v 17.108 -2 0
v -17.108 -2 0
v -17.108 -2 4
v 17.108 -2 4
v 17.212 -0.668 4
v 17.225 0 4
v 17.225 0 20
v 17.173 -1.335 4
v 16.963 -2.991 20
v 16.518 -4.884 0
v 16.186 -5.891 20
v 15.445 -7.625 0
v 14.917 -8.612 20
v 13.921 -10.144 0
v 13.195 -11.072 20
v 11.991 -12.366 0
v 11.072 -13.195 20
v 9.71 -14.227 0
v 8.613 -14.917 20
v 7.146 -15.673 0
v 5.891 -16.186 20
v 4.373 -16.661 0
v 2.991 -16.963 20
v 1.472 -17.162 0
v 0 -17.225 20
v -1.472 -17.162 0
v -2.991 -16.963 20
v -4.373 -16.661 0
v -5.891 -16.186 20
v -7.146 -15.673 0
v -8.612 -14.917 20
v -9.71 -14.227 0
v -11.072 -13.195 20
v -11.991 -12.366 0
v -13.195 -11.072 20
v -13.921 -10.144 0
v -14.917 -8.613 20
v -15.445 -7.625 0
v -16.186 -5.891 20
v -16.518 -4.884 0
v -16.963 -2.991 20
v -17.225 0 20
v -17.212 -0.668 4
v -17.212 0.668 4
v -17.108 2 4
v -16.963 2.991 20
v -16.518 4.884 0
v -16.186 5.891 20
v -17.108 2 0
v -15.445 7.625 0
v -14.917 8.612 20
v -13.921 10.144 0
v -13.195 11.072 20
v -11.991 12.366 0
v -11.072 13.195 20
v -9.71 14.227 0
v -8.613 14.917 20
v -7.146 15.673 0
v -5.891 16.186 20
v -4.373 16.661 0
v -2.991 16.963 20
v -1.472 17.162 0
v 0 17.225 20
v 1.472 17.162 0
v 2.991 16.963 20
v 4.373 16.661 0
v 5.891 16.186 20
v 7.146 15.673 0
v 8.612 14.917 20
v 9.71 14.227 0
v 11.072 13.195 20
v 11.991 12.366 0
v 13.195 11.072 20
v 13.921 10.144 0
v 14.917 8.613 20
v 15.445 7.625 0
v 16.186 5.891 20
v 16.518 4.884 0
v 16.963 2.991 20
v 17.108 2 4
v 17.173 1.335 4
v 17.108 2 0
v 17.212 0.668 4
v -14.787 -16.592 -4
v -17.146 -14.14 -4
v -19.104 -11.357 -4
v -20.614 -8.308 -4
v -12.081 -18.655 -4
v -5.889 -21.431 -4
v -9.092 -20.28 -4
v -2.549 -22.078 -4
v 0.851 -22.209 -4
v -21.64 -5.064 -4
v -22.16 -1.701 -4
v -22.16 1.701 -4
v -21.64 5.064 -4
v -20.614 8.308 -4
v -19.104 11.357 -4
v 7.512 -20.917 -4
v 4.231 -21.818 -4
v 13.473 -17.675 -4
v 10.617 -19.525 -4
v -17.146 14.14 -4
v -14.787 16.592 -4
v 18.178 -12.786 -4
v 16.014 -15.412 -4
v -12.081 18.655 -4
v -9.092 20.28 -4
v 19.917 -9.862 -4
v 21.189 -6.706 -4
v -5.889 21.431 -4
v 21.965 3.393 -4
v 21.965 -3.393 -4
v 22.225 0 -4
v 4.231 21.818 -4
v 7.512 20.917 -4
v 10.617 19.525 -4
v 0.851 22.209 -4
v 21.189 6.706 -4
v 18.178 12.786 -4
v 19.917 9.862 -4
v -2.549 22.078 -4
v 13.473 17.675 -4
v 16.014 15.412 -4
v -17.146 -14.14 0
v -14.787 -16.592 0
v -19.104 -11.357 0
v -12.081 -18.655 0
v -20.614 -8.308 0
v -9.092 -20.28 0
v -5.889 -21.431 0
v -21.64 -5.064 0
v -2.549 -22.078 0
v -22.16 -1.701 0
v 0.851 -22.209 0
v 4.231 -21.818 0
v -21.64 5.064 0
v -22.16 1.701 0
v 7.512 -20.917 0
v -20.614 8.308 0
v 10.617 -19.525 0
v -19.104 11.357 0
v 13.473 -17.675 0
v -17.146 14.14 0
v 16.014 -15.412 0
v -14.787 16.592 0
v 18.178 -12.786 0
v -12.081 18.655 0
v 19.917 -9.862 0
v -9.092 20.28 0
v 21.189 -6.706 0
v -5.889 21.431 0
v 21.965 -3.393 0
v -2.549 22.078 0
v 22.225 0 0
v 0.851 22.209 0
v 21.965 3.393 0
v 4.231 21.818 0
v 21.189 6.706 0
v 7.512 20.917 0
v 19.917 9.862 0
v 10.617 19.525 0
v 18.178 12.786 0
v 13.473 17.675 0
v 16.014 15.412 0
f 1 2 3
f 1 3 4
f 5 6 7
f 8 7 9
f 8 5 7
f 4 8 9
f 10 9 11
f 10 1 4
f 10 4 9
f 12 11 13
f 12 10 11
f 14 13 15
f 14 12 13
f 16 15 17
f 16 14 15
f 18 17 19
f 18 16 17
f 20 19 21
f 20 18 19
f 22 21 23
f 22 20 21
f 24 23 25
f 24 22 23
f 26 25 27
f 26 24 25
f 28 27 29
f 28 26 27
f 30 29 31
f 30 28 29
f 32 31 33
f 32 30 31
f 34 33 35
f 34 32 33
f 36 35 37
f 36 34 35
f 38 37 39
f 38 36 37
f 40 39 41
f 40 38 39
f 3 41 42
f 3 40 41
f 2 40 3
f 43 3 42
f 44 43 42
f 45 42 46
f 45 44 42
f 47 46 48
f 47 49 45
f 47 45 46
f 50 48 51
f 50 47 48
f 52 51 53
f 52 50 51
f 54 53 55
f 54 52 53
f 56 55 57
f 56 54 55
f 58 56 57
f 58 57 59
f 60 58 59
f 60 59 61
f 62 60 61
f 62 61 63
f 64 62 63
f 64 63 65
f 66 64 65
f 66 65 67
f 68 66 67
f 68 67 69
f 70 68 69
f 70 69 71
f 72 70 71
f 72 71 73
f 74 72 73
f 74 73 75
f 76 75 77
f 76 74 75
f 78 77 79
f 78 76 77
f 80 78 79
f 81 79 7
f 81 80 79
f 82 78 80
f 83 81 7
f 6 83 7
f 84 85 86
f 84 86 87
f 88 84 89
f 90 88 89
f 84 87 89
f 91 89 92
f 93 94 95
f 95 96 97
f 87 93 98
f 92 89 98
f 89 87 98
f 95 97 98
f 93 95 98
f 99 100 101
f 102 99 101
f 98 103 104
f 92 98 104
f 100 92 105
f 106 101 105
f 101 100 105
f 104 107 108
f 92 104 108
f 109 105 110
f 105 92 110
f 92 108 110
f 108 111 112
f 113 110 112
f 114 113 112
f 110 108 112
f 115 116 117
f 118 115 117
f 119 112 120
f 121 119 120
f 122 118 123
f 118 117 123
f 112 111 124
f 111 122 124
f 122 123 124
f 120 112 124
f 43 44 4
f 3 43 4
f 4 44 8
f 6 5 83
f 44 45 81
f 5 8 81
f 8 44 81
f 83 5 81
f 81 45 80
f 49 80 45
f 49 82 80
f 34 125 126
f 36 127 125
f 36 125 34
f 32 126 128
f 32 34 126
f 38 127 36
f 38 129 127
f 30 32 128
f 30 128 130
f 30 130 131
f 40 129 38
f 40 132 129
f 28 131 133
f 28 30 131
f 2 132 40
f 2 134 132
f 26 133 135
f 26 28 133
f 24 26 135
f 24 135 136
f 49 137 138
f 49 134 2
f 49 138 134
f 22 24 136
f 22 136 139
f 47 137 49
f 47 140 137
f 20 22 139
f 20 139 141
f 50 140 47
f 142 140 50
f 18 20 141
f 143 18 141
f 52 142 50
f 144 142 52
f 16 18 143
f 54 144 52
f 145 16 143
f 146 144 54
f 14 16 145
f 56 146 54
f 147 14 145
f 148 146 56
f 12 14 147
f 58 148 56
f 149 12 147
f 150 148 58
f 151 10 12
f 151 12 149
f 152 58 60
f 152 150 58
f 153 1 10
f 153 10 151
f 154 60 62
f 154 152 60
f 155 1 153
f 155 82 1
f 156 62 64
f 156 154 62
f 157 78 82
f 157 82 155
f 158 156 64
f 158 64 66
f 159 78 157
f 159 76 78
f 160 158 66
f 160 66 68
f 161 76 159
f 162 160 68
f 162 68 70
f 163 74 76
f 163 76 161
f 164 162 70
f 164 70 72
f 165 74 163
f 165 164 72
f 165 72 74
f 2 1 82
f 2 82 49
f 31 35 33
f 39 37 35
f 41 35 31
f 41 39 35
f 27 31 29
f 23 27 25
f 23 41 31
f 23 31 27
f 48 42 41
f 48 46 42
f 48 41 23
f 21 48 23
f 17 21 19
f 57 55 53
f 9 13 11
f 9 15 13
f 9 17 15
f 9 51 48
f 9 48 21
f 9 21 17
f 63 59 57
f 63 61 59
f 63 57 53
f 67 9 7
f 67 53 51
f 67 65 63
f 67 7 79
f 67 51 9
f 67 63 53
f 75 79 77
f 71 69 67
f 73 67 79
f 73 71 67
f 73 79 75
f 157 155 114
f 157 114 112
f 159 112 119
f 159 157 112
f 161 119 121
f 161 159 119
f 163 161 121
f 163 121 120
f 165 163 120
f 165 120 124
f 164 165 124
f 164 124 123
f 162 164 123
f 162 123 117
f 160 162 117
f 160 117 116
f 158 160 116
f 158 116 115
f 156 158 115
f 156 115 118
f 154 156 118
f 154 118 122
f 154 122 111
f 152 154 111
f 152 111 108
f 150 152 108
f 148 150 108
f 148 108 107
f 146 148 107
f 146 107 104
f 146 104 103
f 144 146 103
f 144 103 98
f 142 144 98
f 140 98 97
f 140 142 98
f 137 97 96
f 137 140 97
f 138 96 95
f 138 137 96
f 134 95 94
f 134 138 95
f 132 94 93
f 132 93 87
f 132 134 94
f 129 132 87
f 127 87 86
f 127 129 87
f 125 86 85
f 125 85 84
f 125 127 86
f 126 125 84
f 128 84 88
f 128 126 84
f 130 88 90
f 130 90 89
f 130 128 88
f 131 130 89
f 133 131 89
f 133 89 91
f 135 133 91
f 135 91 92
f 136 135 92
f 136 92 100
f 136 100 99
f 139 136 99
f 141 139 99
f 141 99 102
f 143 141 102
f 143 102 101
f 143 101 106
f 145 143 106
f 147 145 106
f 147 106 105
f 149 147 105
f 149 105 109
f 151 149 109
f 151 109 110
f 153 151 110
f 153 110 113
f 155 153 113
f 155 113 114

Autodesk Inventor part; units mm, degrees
ref_plane "YZ Plane" through (0, 0, 0) normal (1, 0, 0) x (0, 1, 0)
ref_plane "XZ Plane" through (0, 0, 0) normal (0, 1, 0) x (-1, 0, 0)
ref_plane "XY Plane" through (0, 0, 0) normal (0, 0, 1) x (1, 0, 0)
sketch "Sketch1" plane through (0, 0, 0) normal (0, 0, 1) x (1, 0, 0)
  circle A0 centre (0, 0) radius 22.225
  circle A1 centre (0, 0) radius 17.225
  line L0 (-17.225, -2) -> (17.225, -2)
  line L1 (17.225, -2) -> (17.225, 2)
  line L2 (17.225, 2) -> (-17.225, 2)
  line L3 (-17.225, 2) -> (-17.225, -2)
  line L4 (-17.225, -2) -> (17.225, 2) construction
  line L5 (17.225, -2) -> (-17.225, 2) construction
  dimension "d0" = 44.45
  dimension "d1" = 34.45
  dimension "d2" = 4
extrude "Extrusion1" add sketch "Sketch1" against normal blind 4 contours A0 | A1 L0 L2 | L1 L0 A1 | A1 L2 L1 | L2 A1 | A1 L0 | A1 L3 L2 | L0 L3 A1
extrude "Extrusion2" add sketch "Sketch1" along normal blind 20 contours A1 L0 L2 | L2 A1 | A1 L0
extrude "Extrusion3" cut sketch "Sketch1" along normal blind 4 contours A1 L0 L2 | L1 L0 A1 | A1 L2 L1 | A1 L3 L2 | L0 L3 A1
equation "\"d0\" = tube_ID"
equation "\"d3\" = sheet"
equation "\"d5\" = 5 * sheet"
equation "\"d7\" = sheet"
equation "\"tube_ID\" = 44.45"
equation "\"sheet\" = 4"
properties part number "battery_endcap"
